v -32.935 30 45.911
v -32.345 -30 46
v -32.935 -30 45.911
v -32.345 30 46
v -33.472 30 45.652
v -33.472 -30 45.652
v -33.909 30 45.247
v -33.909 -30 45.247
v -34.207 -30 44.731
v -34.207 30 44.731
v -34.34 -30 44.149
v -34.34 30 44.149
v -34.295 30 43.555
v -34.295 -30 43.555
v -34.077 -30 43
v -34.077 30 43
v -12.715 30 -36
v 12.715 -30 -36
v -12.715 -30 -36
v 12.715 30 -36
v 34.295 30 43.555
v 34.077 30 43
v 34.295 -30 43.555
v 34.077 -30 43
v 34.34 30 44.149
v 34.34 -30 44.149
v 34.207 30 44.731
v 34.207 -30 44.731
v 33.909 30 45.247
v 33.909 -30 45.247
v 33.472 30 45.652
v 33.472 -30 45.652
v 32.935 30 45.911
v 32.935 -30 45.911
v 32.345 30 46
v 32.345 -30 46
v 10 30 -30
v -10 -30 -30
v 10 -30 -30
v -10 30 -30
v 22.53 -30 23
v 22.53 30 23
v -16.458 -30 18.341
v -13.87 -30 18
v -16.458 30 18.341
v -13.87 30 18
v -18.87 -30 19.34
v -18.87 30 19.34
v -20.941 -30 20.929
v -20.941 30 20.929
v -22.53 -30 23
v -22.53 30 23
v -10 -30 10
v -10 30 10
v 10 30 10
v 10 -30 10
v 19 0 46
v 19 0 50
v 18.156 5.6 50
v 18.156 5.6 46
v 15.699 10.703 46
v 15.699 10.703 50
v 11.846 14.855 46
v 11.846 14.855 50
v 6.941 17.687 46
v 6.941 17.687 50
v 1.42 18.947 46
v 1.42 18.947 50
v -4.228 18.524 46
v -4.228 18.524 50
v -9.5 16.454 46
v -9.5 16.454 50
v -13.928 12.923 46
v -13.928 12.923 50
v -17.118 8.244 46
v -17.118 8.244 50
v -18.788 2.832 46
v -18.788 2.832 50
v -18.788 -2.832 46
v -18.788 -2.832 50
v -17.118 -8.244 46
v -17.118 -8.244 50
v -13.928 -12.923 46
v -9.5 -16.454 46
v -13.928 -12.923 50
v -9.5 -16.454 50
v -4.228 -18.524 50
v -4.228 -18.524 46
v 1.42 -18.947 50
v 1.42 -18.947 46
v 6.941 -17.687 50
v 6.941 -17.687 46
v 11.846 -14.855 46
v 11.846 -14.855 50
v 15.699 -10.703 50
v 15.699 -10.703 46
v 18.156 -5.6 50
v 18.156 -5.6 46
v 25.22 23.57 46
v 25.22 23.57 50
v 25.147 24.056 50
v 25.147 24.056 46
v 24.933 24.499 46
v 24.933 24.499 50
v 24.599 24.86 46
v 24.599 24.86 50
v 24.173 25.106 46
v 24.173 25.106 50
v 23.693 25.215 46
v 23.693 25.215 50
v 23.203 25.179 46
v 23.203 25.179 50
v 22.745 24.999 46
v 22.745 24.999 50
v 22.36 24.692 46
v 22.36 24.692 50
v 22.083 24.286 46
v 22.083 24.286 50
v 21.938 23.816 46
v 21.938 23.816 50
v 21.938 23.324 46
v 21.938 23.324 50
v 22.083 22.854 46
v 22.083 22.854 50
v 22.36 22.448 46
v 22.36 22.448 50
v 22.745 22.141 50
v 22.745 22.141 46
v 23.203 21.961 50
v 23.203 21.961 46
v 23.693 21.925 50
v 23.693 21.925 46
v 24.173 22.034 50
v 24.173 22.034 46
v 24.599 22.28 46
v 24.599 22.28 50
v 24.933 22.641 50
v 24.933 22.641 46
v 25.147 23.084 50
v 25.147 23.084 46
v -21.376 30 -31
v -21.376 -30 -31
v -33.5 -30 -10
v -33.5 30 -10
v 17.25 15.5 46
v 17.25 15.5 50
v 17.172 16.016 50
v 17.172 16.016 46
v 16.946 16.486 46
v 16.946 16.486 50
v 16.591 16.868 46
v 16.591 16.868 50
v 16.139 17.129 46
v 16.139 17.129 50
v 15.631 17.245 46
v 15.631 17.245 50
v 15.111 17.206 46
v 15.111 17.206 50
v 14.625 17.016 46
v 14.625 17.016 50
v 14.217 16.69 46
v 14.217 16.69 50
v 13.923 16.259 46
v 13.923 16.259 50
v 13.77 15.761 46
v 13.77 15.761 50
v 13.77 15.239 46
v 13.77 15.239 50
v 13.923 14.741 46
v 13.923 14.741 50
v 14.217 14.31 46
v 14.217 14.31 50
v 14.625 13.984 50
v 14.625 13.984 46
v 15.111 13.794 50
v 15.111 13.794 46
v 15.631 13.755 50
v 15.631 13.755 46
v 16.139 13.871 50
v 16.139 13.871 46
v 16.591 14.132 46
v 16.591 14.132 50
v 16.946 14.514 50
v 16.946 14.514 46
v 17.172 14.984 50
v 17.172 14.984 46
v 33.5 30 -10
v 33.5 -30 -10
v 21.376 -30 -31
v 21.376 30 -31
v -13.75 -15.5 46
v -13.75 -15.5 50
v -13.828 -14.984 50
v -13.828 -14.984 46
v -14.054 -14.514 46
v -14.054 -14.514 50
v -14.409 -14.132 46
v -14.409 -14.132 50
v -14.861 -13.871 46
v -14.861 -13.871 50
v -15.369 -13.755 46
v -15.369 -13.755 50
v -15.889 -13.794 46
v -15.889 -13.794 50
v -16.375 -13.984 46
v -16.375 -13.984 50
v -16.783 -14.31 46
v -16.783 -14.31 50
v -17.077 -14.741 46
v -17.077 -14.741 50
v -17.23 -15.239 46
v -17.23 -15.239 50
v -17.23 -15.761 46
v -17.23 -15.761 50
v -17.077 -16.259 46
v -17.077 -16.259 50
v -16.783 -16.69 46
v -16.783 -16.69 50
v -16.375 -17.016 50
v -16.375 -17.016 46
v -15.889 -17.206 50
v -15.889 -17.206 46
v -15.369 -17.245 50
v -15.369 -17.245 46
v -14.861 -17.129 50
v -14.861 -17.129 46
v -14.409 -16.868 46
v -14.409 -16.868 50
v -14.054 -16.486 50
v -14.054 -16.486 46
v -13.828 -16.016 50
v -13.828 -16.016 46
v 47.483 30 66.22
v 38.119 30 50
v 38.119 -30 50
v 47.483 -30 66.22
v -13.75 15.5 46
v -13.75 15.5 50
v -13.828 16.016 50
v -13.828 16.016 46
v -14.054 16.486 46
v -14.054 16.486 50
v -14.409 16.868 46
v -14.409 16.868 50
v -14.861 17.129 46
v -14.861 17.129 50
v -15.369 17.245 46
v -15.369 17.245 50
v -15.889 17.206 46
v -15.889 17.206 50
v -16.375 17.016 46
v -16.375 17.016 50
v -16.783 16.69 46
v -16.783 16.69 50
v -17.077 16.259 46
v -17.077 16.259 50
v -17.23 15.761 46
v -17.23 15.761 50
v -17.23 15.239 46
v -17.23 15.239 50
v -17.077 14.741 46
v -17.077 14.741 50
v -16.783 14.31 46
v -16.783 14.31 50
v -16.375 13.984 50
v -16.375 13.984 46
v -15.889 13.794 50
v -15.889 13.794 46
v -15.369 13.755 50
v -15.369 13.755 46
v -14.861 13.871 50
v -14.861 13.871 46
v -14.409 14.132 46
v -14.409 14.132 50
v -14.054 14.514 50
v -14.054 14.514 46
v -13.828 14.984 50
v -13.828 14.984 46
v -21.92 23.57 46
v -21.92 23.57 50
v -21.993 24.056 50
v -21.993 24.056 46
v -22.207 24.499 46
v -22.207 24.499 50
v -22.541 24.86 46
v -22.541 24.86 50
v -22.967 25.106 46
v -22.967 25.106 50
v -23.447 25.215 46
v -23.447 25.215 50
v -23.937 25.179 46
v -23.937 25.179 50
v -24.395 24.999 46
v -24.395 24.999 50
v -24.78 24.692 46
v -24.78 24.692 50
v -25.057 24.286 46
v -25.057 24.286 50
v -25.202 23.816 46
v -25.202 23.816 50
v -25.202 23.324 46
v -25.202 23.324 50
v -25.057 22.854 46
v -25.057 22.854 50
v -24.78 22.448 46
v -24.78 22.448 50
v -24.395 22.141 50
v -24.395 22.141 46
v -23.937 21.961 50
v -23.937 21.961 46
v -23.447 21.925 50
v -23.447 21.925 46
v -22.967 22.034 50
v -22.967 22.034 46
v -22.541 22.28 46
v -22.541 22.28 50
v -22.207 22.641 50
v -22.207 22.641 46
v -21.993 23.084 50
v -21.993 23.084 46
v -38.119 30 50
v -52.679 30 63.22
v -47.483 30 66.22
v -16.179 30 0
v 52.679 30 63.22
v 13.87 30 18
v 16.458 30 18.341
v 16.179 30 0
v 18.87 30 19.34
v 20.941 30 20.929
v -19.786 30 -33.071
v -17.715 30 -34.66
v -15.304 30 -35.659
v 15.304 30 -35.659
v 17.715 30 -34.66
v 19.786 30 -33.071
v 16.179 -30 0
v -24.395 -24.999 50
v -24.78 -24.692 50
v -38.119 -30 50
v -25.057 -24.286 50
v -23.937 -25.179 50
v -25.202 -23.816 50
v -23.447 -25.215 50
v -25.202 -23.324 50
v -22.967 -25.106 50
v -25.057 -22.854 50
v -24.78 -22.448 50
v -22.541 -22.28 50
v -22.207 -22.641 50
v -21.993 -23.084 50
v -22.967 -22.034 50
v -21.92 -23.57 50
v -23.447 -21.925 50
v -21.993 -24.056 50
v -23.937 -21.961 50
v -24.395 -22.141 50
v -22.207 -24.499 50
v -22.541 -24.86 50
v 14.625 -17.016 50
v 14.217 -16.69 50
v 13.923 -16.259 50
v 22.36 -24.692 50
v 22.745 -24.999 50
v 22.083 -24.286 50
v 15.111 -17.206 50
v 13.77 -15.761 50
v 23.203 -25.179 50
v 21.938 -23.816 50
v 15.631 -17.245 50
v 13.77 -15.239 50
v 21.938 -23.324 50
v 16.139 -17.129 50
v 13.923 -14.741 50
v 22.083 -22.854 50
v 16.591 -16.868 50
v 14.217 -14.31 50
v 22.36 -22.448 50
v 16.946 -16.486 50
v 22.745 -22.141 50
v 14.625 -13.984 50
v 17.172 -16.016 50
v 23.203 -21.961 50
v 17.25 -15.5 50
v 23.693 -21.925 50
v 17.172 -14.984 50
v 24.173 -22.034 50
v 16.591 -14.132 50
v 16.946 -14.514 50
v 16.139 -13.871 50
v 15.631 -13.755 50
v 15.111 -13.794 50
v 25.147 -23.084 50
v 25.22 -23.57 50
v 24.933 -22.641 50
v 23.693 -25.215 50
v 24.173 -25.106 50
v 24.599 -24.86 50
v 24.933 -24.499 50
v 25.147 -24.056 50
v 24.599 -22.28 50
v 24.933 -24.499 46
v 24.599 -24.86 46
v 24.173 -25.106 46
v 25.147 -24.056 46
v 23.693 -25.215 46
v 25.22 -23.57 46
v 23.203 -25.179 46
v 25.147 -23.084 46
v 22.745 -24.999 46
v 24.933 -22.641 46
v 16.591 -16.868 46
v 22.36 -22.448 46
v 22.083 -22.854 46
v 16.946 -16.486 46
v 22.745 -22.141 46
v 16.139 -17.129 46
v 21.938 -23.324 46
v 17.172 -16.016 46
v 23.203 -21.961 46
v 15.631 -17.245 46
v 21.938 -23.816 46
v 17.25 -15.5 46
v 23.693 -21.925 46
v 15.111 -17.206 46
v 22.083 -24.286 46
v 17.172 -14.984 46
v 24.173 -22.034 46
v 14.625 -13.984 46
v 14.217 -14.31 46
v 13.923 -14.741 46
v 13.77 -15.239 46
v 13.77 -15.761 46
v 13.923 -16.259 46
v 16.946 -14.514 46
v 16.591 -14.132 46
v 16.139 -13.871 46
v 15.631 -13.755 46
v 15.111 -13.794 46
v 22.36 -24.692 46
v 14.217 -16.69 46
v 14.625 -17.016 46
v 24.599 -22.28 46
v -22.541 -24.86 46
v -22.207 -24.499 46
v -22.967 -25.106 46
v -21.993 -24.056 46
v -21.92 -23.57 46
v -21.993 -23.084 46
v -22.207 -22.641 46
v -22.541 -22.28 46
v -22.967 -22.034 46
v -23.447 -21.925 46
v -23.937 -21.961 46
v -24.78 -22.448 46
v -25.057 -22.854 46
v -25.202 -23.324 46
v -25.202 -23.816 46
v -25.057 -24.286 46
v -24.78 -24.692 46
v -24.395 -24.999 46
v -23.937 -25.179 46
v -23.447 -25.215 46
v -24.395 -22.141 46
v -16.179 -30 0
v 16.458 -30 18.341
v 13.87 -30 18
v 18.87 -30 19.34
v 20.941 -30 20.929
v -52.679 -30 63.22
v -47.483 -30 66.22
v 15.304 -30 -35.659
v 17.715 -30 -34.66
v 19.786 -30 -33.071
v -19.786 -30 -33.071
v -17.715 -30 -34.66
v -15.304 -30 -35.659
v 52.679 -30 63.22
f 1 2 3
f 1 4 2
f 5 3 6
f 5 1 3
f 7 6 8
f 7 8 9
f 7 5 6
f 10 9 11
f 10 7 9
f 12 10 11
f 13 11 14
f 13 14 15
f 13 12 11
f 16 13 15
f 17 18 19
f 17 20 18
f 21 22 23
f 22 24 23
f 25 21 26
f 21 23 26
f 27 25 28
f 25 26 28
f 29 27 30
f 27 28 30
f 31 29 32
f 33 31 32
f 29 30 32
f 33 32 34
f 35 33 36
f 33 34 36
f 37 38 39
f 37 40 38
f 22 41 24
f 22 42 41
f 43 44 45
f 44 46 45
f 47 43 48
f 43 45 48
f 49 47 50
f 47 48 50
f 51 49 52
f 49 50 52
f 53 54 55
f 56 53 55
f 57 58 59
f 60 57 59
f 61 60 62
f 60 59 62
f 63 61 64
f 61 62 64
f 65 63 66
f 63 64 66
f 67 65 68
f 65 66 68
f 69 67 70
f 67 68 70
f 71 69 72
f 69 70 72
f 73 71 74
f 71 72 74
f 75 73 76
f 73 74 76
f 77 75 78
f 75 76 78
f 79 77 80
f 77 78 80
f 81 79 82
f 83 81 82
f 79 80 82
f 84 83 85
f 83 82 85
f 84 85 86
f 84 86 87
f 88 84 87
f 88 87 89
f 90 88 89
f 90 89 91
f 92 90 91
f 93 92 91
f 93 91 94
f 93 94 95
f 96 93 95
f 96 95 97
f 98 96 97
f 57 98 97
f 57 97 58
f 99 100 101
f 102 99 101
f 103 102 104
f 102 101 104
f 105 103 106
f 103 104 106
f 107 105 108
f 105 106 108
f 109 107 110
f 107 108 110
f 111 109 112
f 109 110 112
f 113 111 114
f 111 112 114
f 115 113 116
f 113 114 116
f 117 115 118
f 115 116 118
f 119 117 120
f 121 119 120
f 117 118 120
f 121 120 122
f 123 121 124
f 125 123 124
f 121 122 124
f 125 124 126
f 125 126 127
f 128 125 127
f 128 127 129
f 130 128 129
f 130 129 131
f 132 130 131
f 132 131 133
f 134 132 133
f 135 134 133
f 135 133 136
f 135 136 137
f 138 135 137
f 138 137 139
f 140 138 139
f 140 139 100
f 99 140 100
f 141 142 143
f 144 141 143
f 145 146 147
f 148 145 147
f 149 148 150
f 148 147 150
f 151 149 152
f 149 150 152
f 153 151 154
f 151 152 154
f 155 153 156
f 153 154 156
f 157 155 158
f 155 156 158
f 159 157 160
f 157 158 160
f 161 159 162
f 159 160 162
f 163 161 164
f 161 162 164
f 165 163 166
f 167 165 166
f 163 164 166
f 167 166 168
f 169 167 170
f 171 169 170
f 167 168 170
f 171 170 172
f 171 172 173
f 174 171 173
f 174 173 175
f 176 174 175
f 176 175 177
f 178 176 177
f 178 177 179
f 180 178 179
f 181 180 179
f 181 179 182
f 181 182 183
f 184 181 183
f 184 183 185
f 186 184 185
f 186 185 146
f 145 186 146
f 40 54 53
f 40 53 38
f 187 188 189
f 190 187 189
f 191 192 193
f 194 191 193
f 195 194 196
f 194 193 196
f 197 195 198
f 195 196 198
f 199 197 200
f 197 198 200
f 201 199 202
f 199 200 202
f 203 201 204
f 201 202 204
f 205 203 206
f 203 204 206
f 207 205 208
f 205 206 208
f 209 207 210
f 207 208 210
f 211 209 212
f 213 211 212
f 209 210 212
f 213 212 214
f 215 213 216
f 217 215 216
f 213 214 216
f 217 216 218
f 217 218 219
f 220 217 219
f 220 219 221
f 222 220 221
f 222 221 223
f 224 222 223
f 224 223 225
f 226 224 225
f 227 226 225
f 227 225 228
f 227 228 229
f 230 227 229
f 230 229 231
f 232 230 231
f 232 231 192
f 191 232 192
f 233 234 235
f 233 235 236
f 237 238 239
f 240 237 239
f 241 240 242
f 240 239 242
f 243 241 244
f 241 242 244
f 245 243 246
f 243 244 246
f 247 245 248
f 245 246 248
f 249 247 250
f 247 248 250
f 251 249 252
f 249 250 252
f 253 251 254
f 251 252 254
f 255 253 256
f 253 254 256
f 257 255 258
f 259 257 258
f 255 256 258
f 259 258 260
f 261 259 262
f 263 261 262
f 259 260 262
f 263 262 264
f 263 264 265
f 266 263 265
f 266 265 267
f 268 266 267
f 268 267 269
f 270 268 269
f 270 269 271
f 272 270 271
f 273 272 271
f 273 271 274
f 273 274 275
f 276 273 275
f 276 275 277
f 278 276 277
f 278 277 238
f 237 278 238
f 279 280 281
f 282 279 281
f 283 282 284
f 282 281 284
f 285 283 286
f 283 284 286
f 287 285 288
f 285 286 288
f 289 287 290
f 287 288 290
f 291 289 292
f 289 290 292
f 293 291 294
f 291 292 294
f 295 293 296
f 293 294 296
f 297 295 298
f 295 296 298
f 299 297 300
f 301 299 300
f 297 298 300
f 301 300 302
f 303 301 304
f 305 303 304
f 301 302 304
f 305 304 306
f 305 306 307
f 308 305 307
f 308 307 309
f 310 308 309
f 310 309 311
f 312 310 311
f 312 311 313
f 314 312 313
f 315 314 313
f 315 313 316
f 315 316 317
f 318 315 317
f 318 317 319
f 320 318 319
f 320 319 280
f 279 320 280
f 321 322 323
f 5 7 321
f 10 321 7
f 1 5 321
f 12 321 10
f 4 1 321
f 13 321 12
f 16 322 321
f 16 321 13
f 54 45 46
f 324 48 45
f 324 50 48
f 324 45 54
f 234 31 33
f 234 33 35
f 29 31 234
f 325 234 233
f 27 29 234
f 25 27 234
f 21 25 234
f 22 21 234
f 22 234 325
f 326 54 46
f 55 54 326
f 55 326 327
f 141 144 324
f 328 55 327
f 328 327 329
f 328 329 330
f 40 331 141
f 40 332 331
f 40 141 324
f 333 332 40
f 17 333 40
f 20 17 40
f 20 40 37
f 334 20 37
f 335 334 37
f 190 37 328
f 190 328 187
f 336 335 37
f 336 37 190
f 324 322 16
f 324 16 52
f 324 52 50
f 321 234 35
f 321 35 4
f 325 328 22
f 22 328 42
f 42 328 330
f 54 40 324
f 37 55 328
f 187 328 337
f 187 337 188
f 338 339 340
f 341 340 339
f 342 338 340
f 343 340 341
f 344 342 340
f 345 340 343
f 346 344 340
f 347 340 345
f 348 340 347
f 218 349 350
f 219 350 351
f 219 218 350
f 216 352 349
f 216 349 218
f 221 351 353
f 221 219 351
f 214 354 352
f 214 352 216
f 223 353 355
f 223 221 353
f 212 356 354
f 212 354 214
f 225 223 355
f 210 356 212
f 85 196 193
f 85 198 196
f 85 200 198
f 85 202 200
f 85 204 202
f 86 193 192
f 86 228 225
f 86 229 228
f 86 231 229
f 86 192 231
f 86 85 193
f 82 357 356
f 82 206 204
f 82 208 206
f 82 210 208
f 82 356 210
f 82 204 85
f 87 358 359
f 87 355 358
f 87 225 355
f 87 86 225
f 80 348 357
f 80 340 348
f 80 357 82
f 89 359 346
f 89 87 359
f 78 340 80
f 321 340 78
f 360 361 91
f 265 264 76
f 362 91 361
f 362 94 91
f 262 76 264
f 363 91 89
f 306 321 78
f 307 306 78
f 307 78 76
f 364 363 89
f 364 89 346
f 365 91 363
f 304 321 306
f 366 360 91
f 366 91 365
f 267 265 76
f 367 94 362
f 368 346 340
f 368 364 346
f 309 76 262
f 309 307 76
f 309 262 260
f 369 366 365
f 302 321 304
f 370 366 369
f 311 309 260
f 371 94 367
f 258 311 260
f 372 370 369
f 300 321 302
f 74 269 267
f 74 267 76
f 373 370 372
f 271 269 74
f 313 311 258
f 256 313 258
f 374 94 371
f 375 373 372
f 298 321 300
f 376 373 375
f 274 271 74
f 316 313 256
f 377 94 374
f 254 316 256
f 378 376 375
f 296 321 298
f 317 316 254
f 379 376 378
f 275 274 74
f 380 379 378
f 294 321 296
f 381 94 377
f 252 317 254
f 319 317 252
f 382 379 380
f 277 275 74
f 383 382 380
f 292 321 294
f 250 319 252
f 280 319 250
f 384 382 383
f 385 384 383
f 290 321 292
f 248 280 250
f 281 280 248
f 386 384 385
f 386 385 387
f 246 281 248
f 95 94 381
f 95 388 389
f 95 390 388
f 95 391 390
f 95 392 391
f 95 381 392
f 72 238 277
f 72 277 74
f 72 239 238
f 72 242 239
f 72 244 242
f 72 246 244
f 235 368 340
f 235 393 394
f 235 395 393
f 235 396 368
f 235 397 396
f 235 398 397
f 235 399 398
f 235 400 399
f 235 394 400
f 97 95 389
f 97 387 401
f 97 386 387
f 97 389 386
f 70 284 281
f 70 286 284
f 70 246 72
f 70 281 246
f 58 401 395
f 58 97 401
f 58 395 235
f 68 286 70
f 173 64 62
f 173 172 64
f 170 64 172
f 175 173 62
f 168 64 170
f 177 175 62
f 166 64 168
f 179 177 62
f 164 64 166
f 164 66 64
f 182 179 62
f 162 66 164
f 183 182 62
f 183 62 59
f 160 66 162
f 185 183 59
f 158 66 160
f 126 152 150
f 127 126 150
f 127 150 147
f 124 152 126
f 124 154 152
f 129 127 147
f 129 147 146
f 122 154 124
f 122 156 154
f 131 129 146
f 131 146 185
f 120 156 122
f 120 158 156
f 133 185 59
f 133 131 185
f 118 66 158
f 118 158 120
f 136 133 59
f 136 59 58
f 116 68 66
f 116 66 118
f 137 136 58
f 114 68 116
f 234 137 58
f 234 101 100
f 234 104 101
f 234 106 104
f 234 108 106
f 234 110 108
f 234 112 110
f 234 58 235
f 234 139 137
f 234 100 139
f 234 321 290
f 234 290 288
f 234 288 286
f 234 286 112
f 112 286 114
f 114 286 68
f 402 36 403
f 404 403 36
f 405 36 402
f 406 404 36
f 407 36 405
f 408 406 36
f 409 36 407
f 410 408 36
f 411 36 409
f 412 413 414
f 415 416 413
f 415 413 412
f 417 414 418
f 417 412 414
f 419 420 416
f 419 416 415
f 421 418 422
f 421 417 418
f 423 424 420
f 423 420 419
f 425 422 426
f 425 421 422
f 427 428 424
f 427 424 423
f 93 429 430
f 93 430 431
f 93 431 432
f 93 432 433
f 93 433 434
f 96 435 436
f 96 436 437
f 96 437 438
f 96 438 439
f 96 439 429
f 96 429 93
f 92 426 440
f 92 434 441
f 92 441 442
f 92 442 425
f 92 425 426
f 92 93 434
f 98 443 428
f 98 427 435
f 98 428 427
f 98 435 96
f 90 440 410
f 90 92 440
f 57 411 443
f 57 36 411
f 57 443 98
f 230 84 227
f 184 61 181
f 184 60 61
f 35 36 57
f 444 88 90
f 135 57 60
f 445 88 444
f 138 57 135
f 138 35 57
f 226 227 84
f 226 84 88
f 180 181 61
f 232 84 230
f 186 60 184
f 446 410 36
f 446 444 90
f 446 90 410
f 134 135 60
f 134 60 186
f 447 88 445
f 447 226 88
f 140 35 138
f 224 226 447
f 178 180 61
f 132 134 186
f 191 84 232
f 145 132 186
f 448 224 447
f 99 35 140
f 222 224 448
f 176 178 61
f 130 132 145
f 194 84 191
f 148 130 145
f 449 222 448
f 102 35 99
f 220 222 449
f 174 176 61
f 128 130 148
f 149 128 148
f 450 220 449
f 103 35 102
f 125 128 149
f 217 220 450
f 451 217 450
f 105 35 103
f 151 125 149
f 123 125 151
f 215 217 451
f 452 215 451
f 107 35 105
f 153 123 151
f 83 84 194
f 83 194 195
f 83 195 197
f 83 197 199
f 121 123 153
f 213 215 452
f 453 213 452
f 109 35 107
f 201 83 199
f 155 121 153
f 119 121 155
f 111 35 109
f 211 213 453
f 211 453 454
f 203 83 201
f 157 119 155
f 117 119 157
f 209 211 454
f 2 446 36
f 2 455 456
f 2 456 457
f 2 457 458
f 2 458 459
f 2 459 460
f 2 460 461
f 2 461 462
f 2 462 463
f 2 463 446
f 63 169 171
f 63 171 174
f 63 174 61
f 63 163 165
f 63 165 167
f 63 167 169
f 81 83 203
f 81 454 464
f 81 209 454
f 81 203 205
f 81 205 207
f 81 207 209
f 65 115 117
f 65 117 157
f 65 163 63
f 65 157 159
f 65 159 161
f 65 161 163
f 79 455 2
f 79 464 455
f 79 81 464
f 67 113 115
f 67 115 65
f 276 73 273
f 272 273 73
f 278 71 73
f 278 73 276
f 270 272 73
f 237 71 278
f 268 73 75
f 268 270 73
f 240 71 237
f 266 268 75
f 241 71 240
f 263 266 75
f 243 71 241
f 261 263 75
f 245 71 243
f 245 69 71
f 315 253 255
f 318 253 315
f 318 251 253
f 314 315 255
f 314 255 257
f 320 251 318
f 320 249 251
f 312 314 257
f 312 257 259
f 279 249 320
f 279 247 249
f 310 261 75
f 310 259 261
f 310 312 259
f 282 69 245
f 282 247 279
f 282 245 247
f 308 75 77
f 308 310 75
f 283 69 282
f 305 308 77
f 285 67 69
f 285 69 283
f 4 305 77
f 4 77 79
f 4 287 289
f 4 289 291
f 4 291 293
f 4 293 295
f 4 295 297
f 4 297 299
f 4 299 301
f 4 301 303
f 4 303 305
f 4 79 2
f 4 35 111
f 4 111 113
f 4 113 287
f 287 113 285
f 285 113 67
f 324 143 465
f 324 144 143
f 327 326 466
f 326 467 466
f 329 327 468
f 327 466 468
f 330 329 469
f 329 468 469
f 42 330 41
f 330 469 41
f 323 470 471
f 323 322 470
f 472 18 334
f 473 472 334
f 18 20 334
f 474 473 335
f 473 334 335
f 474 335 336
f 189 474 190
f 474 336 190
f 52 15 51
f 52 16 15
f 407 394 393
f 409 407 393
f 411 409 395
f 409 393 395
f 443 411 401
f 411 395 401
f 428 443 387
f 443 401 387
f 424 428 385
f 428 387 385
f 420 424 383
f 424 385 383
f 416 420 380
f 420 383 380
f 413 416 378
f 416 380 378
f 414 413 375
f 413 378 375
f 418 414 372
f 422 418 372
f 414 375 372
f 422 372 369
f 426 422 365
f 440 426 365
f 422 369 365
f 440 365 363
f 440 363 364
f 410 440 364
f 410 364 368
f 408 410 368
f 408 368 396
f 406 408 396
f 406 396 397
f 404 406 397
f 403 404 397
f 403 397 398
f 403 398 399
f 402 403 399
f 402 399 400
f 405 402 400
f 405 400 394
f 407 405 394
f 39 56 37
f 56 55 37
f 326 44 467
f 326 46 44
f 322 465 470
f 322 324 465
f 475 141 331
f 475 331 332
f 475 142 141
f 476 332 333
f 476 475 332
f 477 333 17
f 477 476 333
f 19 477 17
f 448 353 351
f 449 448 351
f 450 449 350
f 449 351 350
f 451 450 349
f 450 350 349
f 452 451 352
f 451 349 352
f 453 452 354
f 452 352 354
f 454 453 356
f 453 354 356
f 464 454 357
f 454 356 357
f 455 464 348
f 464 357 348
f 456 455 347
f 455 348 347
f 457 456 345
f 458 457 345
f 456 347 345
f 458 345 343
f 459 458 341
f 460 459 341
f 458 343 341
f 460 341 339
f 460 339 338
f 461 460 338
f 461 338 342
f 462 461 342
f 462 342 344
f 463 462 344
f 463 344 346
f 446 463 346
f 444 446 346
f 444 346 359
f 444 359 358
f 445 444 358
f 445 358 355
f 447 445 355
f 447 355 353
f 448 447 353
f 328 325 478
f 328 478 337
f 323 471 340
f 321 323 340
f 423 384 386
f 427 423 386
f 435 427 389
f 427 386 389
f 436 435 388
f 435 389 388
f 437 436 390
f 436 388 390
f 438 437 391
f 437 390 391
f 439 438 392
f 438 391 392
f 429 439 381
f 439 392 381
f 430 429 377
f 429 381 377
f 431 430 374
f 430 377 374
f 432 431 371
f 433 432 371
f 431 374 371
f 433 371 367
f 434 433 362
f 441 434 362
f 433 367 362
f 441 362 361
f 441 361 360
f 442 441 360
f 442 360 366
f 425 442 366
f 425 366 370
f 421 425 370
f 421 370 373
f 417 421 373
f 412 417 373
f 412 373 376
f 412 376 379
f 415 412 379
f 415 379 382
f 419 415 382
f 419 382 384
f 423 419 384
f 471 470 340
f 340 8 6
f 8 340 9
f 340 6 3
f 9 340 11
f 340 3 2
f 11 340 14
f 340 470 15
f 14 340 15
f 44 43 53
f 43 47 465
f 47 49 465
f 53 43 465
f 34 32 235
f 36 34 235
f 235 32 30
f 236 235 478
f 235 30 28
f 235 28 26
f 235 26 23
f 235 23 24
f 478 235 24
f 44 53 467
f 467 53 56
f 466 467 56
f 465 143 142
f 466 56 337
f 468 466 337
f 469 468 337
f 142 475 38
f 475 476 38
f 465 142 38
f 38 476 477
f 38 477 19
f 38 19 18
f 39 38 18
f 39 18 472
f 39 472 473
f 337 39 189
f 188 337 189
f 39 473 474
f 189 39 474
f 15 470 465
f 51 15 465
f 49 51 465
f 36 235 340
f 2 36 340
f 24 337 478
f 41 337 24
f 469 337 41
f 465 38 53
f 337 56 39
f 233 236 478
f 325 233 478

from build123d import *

# Parameters (mm, degrees)
SKETCH_1_W        = 20
SKETCH_1_H        = 40
EXTRUDE_821_DEPTH = 30
FILLET_1_R        = 10
FILLET_2_R        = 2
NEMA17_REACH      = 107.219
SKETCH_2_R        = 19
SKETCH_2_R_2      = 1.75
NEMA23_M4_REACH   = 107.219
NEMA23_M4_BORE_R  = 1.65


with BuildPart() as part:
    # Эскиз1 → Extrude 821 (new, symmetric)
    with BuildSketch(Plane(origin=(0, 0, 0), x_dir=(1, 0, 0), z_dir=(0, 1, 0))):
        Polygon((-38.118802154, -50), (38.118802154, -50), (47.483339502, -66.219854476), (52.679491924, -63.219854476), (16.179491924, 0), (33.5, 10), (18.488893001, 36), (-18.488893001, 36), (-33.5, 10), (-16.179491924, 0), (-52.679491924, -63.219854476), (-47.483339502, -66.219854476), align=None)
        Polygon((-35.809401077, -46), (-19.643593539, -18), (19.643593539, -18), (35.809401077, -46), align=None, mode=Mode.SUBTRACT)
        with Locations((0, 10)):
            Rectangle(SKETCH_1_W, SKETCH_1_H, mode=Mode.SUBTRACT)
    extrude(amount=EXTRUDE_821_DEPTH, both=True)

    # Скругление1
    fillet_1_edges = [part.edges().sort_by_distance(p)[0] for p in [
        (-18.488893001, 0, -36),
        (18.488893001, 0, -36),
        (19.643593539, 0, 18),
        (-19.643593539, 0, 18),
    ]]
    fillet(fillet_1_edges, radius=FILLET_1_R)

    # Скругление2
    fillet_2_edges = [part.edges().sort_by_distance(p)[0] for p in [
        (35.809401077, 0, 46),
        (-35.809401077, 0, 46),
    ]]
    fillet(fillet_2_edges, radius=FILLET_2_R)

    # Эскиз2 → Nema17 (cut, up to next)
    with BuildSketch(Plane.XY.offset(50), mode=Mode.PRIVATE) as nema17_sk1:
        Circle(SKETCH_2_R)
    nema17_tool1 = extrude(nema17_sk1.sketch, amount=-NEMA17_REACH, mode=Mode.PRIVATE) & part.part
    # Эскиз2 → Nema17 (cut, up to next)
    with BuildSketch(Plane.XY.offset(50), mode=Mode.PRIVATE) as nema17_sk2:
        with Locations((-15.5, 15.5)):
            Circle(SKETCH_2_R_2)
    nema17_tool2 = extrude(nema17_sk2.sketch, amount=-NEMA17_REACH, mode=Mode.PRIVATE) & part.part
    # Эскиз2 → Nema17 (cut, up to next)
    with BuildSketch(Plane.XY.offset(50), mode=Mode.PRIVATE) as nema17_sk3:
        with Locations((15.5, 15.5)):
            Circle(SKETCH_2_R_2)
    nema17_tool3 = extrude(nema17_sk3.sketch, amount=-NEMA17_REACH, mode=Mode.PRIVATE) & part.part
    # Эскиз2 → Nema17 (cut, up to next)
    with BuildSketch(Plane.XY.offset(50), mode=Mode.PRIVATE) as nema17_sk4:
        with Locations((15.5, -15.5)):
            Circle(SKETCH_2_R_2)
    nema17_tool4 = extrude(nema17_sk4.sketch, amount=-NEMA17_REACH, mode=Mode.PRIVATE) & part.part
    # Эскиз2 → Nema17 (cut, up to next)
    with BuildSketch(Plane.XY.offset(50), mode=Mode.PRIVATE) as nema17_sk5:
        with Locations((-15.5, -15.5)):
            Circle(SKETCH_2_R_2)
    nema17_tool5 = extrude(nema17_sk5.sketch, amount=-NEMA17_REACH, mode=Mode.PRIVATE) & part.part
    add(nema17_tool1.solids().sort_by_distance((0, 0, 50))[0], mode=Mode.SUBTRACT)
    add(nema17_tool2.solids().sort_by_distance((-15.5, 15.5, 50))[0], mode=Mode.SUBTRACT)
    add(nema17_tool3.solids().sort_by_distance((15.5, 15.5, 50))[0], mode=Mode.SUBTRACT)
    add(nema17_tool4.solids().sort_by_distance((15.5, -15.5, 50))[0], mode=Mode.SUBTRACT)
    add(nema17_tool5.solids().sort_by_distance((-15.5, -15.5, 50))[0], mode=Mode.SUBTRACT)

    # Nema23 - M4 bore → Nema23 - M4 (cut, up to next)
    with BuildSketch(Plane.XY.offset(50), mode=Mode.PRIVATE) as nema23_m4_sk1:
        with Locations((-23.57, 23.57)):
            Circle(NEMA23_M4_BORE_R)
    nema23_m4_tool1 = extrude(nema23_m4_sk1.sketch, amount=-NEMA23_M4_REACH, mode=Mode.PRIVATE) & part.part
    # Nema23 - M4 bore → Nema23 - M4 (cut, up to next)
    with BuildSketch(Plane.XY.offset(50), mode=Mode.PRIVATE) as nema23_m4_sk2:
        with Locations((23.57, 23.57)):
            Circle(NEMA23_M4_BORE_R)
    nema23_m4_tool2 = extrude(nema23_m4_sk2.sketch, amount=-NEMA23_M4_REACH, mode=Mode.PRIVATE) & part.part
    # Nema23 - M4 bore → Nema23 - M4 (cut, up to next)
    with BuildSketch(Plane.XY.offset(50), mode=Mode.PRIVATE) as nema23_m4_sk3:
        with Locations((23.57, -23.57)):
            Circle(NEMA23_M4_BORE_R)
    nema23_m4_tool3 = extrude(nema23_m4_sk3.sketch, amount=-NEMA23_M4_REACH, mode=Mode.PRIVATE) & part.part
    # Nema23 - M4 bore → Nema23 - M4 (cut, up to next)
    with BuildSketch(Plane.XY.offset(50), mode=Mode.PRIVATE) as nema23_m4_sk4:
        with Locations((-23.57, -23.57)):
            Circle(NEMA23_M4_BORE_R)
    nema23_m4_tool4 = extrude(nema23_m4_sk4.sketch, amount=-NEMA23_M4_REACH, mode=Mode.PRIVATE) & part.part
    add(nema23_m4_tool1.solids().sort_by_distance((-23.57, 23.57, 50))[0], mode=Mode.SUBTRACT)
    add(nema23_m4_tool2.solids().sort_by_distance((23.57, 23.57, 50))[0], mode=Mode.SUBTRACT)
    add(nema23_m4_tool3.solids().sort_by_distance((23.57, -23.57, 50))[0], mode=Mode.SUBTRACT)
    add(nema23_m4_tool4.solids().sort_by_distance((-23.57, -23.57, 50))[0], mode=Mode.SUBTRACT)


solid = part.part
